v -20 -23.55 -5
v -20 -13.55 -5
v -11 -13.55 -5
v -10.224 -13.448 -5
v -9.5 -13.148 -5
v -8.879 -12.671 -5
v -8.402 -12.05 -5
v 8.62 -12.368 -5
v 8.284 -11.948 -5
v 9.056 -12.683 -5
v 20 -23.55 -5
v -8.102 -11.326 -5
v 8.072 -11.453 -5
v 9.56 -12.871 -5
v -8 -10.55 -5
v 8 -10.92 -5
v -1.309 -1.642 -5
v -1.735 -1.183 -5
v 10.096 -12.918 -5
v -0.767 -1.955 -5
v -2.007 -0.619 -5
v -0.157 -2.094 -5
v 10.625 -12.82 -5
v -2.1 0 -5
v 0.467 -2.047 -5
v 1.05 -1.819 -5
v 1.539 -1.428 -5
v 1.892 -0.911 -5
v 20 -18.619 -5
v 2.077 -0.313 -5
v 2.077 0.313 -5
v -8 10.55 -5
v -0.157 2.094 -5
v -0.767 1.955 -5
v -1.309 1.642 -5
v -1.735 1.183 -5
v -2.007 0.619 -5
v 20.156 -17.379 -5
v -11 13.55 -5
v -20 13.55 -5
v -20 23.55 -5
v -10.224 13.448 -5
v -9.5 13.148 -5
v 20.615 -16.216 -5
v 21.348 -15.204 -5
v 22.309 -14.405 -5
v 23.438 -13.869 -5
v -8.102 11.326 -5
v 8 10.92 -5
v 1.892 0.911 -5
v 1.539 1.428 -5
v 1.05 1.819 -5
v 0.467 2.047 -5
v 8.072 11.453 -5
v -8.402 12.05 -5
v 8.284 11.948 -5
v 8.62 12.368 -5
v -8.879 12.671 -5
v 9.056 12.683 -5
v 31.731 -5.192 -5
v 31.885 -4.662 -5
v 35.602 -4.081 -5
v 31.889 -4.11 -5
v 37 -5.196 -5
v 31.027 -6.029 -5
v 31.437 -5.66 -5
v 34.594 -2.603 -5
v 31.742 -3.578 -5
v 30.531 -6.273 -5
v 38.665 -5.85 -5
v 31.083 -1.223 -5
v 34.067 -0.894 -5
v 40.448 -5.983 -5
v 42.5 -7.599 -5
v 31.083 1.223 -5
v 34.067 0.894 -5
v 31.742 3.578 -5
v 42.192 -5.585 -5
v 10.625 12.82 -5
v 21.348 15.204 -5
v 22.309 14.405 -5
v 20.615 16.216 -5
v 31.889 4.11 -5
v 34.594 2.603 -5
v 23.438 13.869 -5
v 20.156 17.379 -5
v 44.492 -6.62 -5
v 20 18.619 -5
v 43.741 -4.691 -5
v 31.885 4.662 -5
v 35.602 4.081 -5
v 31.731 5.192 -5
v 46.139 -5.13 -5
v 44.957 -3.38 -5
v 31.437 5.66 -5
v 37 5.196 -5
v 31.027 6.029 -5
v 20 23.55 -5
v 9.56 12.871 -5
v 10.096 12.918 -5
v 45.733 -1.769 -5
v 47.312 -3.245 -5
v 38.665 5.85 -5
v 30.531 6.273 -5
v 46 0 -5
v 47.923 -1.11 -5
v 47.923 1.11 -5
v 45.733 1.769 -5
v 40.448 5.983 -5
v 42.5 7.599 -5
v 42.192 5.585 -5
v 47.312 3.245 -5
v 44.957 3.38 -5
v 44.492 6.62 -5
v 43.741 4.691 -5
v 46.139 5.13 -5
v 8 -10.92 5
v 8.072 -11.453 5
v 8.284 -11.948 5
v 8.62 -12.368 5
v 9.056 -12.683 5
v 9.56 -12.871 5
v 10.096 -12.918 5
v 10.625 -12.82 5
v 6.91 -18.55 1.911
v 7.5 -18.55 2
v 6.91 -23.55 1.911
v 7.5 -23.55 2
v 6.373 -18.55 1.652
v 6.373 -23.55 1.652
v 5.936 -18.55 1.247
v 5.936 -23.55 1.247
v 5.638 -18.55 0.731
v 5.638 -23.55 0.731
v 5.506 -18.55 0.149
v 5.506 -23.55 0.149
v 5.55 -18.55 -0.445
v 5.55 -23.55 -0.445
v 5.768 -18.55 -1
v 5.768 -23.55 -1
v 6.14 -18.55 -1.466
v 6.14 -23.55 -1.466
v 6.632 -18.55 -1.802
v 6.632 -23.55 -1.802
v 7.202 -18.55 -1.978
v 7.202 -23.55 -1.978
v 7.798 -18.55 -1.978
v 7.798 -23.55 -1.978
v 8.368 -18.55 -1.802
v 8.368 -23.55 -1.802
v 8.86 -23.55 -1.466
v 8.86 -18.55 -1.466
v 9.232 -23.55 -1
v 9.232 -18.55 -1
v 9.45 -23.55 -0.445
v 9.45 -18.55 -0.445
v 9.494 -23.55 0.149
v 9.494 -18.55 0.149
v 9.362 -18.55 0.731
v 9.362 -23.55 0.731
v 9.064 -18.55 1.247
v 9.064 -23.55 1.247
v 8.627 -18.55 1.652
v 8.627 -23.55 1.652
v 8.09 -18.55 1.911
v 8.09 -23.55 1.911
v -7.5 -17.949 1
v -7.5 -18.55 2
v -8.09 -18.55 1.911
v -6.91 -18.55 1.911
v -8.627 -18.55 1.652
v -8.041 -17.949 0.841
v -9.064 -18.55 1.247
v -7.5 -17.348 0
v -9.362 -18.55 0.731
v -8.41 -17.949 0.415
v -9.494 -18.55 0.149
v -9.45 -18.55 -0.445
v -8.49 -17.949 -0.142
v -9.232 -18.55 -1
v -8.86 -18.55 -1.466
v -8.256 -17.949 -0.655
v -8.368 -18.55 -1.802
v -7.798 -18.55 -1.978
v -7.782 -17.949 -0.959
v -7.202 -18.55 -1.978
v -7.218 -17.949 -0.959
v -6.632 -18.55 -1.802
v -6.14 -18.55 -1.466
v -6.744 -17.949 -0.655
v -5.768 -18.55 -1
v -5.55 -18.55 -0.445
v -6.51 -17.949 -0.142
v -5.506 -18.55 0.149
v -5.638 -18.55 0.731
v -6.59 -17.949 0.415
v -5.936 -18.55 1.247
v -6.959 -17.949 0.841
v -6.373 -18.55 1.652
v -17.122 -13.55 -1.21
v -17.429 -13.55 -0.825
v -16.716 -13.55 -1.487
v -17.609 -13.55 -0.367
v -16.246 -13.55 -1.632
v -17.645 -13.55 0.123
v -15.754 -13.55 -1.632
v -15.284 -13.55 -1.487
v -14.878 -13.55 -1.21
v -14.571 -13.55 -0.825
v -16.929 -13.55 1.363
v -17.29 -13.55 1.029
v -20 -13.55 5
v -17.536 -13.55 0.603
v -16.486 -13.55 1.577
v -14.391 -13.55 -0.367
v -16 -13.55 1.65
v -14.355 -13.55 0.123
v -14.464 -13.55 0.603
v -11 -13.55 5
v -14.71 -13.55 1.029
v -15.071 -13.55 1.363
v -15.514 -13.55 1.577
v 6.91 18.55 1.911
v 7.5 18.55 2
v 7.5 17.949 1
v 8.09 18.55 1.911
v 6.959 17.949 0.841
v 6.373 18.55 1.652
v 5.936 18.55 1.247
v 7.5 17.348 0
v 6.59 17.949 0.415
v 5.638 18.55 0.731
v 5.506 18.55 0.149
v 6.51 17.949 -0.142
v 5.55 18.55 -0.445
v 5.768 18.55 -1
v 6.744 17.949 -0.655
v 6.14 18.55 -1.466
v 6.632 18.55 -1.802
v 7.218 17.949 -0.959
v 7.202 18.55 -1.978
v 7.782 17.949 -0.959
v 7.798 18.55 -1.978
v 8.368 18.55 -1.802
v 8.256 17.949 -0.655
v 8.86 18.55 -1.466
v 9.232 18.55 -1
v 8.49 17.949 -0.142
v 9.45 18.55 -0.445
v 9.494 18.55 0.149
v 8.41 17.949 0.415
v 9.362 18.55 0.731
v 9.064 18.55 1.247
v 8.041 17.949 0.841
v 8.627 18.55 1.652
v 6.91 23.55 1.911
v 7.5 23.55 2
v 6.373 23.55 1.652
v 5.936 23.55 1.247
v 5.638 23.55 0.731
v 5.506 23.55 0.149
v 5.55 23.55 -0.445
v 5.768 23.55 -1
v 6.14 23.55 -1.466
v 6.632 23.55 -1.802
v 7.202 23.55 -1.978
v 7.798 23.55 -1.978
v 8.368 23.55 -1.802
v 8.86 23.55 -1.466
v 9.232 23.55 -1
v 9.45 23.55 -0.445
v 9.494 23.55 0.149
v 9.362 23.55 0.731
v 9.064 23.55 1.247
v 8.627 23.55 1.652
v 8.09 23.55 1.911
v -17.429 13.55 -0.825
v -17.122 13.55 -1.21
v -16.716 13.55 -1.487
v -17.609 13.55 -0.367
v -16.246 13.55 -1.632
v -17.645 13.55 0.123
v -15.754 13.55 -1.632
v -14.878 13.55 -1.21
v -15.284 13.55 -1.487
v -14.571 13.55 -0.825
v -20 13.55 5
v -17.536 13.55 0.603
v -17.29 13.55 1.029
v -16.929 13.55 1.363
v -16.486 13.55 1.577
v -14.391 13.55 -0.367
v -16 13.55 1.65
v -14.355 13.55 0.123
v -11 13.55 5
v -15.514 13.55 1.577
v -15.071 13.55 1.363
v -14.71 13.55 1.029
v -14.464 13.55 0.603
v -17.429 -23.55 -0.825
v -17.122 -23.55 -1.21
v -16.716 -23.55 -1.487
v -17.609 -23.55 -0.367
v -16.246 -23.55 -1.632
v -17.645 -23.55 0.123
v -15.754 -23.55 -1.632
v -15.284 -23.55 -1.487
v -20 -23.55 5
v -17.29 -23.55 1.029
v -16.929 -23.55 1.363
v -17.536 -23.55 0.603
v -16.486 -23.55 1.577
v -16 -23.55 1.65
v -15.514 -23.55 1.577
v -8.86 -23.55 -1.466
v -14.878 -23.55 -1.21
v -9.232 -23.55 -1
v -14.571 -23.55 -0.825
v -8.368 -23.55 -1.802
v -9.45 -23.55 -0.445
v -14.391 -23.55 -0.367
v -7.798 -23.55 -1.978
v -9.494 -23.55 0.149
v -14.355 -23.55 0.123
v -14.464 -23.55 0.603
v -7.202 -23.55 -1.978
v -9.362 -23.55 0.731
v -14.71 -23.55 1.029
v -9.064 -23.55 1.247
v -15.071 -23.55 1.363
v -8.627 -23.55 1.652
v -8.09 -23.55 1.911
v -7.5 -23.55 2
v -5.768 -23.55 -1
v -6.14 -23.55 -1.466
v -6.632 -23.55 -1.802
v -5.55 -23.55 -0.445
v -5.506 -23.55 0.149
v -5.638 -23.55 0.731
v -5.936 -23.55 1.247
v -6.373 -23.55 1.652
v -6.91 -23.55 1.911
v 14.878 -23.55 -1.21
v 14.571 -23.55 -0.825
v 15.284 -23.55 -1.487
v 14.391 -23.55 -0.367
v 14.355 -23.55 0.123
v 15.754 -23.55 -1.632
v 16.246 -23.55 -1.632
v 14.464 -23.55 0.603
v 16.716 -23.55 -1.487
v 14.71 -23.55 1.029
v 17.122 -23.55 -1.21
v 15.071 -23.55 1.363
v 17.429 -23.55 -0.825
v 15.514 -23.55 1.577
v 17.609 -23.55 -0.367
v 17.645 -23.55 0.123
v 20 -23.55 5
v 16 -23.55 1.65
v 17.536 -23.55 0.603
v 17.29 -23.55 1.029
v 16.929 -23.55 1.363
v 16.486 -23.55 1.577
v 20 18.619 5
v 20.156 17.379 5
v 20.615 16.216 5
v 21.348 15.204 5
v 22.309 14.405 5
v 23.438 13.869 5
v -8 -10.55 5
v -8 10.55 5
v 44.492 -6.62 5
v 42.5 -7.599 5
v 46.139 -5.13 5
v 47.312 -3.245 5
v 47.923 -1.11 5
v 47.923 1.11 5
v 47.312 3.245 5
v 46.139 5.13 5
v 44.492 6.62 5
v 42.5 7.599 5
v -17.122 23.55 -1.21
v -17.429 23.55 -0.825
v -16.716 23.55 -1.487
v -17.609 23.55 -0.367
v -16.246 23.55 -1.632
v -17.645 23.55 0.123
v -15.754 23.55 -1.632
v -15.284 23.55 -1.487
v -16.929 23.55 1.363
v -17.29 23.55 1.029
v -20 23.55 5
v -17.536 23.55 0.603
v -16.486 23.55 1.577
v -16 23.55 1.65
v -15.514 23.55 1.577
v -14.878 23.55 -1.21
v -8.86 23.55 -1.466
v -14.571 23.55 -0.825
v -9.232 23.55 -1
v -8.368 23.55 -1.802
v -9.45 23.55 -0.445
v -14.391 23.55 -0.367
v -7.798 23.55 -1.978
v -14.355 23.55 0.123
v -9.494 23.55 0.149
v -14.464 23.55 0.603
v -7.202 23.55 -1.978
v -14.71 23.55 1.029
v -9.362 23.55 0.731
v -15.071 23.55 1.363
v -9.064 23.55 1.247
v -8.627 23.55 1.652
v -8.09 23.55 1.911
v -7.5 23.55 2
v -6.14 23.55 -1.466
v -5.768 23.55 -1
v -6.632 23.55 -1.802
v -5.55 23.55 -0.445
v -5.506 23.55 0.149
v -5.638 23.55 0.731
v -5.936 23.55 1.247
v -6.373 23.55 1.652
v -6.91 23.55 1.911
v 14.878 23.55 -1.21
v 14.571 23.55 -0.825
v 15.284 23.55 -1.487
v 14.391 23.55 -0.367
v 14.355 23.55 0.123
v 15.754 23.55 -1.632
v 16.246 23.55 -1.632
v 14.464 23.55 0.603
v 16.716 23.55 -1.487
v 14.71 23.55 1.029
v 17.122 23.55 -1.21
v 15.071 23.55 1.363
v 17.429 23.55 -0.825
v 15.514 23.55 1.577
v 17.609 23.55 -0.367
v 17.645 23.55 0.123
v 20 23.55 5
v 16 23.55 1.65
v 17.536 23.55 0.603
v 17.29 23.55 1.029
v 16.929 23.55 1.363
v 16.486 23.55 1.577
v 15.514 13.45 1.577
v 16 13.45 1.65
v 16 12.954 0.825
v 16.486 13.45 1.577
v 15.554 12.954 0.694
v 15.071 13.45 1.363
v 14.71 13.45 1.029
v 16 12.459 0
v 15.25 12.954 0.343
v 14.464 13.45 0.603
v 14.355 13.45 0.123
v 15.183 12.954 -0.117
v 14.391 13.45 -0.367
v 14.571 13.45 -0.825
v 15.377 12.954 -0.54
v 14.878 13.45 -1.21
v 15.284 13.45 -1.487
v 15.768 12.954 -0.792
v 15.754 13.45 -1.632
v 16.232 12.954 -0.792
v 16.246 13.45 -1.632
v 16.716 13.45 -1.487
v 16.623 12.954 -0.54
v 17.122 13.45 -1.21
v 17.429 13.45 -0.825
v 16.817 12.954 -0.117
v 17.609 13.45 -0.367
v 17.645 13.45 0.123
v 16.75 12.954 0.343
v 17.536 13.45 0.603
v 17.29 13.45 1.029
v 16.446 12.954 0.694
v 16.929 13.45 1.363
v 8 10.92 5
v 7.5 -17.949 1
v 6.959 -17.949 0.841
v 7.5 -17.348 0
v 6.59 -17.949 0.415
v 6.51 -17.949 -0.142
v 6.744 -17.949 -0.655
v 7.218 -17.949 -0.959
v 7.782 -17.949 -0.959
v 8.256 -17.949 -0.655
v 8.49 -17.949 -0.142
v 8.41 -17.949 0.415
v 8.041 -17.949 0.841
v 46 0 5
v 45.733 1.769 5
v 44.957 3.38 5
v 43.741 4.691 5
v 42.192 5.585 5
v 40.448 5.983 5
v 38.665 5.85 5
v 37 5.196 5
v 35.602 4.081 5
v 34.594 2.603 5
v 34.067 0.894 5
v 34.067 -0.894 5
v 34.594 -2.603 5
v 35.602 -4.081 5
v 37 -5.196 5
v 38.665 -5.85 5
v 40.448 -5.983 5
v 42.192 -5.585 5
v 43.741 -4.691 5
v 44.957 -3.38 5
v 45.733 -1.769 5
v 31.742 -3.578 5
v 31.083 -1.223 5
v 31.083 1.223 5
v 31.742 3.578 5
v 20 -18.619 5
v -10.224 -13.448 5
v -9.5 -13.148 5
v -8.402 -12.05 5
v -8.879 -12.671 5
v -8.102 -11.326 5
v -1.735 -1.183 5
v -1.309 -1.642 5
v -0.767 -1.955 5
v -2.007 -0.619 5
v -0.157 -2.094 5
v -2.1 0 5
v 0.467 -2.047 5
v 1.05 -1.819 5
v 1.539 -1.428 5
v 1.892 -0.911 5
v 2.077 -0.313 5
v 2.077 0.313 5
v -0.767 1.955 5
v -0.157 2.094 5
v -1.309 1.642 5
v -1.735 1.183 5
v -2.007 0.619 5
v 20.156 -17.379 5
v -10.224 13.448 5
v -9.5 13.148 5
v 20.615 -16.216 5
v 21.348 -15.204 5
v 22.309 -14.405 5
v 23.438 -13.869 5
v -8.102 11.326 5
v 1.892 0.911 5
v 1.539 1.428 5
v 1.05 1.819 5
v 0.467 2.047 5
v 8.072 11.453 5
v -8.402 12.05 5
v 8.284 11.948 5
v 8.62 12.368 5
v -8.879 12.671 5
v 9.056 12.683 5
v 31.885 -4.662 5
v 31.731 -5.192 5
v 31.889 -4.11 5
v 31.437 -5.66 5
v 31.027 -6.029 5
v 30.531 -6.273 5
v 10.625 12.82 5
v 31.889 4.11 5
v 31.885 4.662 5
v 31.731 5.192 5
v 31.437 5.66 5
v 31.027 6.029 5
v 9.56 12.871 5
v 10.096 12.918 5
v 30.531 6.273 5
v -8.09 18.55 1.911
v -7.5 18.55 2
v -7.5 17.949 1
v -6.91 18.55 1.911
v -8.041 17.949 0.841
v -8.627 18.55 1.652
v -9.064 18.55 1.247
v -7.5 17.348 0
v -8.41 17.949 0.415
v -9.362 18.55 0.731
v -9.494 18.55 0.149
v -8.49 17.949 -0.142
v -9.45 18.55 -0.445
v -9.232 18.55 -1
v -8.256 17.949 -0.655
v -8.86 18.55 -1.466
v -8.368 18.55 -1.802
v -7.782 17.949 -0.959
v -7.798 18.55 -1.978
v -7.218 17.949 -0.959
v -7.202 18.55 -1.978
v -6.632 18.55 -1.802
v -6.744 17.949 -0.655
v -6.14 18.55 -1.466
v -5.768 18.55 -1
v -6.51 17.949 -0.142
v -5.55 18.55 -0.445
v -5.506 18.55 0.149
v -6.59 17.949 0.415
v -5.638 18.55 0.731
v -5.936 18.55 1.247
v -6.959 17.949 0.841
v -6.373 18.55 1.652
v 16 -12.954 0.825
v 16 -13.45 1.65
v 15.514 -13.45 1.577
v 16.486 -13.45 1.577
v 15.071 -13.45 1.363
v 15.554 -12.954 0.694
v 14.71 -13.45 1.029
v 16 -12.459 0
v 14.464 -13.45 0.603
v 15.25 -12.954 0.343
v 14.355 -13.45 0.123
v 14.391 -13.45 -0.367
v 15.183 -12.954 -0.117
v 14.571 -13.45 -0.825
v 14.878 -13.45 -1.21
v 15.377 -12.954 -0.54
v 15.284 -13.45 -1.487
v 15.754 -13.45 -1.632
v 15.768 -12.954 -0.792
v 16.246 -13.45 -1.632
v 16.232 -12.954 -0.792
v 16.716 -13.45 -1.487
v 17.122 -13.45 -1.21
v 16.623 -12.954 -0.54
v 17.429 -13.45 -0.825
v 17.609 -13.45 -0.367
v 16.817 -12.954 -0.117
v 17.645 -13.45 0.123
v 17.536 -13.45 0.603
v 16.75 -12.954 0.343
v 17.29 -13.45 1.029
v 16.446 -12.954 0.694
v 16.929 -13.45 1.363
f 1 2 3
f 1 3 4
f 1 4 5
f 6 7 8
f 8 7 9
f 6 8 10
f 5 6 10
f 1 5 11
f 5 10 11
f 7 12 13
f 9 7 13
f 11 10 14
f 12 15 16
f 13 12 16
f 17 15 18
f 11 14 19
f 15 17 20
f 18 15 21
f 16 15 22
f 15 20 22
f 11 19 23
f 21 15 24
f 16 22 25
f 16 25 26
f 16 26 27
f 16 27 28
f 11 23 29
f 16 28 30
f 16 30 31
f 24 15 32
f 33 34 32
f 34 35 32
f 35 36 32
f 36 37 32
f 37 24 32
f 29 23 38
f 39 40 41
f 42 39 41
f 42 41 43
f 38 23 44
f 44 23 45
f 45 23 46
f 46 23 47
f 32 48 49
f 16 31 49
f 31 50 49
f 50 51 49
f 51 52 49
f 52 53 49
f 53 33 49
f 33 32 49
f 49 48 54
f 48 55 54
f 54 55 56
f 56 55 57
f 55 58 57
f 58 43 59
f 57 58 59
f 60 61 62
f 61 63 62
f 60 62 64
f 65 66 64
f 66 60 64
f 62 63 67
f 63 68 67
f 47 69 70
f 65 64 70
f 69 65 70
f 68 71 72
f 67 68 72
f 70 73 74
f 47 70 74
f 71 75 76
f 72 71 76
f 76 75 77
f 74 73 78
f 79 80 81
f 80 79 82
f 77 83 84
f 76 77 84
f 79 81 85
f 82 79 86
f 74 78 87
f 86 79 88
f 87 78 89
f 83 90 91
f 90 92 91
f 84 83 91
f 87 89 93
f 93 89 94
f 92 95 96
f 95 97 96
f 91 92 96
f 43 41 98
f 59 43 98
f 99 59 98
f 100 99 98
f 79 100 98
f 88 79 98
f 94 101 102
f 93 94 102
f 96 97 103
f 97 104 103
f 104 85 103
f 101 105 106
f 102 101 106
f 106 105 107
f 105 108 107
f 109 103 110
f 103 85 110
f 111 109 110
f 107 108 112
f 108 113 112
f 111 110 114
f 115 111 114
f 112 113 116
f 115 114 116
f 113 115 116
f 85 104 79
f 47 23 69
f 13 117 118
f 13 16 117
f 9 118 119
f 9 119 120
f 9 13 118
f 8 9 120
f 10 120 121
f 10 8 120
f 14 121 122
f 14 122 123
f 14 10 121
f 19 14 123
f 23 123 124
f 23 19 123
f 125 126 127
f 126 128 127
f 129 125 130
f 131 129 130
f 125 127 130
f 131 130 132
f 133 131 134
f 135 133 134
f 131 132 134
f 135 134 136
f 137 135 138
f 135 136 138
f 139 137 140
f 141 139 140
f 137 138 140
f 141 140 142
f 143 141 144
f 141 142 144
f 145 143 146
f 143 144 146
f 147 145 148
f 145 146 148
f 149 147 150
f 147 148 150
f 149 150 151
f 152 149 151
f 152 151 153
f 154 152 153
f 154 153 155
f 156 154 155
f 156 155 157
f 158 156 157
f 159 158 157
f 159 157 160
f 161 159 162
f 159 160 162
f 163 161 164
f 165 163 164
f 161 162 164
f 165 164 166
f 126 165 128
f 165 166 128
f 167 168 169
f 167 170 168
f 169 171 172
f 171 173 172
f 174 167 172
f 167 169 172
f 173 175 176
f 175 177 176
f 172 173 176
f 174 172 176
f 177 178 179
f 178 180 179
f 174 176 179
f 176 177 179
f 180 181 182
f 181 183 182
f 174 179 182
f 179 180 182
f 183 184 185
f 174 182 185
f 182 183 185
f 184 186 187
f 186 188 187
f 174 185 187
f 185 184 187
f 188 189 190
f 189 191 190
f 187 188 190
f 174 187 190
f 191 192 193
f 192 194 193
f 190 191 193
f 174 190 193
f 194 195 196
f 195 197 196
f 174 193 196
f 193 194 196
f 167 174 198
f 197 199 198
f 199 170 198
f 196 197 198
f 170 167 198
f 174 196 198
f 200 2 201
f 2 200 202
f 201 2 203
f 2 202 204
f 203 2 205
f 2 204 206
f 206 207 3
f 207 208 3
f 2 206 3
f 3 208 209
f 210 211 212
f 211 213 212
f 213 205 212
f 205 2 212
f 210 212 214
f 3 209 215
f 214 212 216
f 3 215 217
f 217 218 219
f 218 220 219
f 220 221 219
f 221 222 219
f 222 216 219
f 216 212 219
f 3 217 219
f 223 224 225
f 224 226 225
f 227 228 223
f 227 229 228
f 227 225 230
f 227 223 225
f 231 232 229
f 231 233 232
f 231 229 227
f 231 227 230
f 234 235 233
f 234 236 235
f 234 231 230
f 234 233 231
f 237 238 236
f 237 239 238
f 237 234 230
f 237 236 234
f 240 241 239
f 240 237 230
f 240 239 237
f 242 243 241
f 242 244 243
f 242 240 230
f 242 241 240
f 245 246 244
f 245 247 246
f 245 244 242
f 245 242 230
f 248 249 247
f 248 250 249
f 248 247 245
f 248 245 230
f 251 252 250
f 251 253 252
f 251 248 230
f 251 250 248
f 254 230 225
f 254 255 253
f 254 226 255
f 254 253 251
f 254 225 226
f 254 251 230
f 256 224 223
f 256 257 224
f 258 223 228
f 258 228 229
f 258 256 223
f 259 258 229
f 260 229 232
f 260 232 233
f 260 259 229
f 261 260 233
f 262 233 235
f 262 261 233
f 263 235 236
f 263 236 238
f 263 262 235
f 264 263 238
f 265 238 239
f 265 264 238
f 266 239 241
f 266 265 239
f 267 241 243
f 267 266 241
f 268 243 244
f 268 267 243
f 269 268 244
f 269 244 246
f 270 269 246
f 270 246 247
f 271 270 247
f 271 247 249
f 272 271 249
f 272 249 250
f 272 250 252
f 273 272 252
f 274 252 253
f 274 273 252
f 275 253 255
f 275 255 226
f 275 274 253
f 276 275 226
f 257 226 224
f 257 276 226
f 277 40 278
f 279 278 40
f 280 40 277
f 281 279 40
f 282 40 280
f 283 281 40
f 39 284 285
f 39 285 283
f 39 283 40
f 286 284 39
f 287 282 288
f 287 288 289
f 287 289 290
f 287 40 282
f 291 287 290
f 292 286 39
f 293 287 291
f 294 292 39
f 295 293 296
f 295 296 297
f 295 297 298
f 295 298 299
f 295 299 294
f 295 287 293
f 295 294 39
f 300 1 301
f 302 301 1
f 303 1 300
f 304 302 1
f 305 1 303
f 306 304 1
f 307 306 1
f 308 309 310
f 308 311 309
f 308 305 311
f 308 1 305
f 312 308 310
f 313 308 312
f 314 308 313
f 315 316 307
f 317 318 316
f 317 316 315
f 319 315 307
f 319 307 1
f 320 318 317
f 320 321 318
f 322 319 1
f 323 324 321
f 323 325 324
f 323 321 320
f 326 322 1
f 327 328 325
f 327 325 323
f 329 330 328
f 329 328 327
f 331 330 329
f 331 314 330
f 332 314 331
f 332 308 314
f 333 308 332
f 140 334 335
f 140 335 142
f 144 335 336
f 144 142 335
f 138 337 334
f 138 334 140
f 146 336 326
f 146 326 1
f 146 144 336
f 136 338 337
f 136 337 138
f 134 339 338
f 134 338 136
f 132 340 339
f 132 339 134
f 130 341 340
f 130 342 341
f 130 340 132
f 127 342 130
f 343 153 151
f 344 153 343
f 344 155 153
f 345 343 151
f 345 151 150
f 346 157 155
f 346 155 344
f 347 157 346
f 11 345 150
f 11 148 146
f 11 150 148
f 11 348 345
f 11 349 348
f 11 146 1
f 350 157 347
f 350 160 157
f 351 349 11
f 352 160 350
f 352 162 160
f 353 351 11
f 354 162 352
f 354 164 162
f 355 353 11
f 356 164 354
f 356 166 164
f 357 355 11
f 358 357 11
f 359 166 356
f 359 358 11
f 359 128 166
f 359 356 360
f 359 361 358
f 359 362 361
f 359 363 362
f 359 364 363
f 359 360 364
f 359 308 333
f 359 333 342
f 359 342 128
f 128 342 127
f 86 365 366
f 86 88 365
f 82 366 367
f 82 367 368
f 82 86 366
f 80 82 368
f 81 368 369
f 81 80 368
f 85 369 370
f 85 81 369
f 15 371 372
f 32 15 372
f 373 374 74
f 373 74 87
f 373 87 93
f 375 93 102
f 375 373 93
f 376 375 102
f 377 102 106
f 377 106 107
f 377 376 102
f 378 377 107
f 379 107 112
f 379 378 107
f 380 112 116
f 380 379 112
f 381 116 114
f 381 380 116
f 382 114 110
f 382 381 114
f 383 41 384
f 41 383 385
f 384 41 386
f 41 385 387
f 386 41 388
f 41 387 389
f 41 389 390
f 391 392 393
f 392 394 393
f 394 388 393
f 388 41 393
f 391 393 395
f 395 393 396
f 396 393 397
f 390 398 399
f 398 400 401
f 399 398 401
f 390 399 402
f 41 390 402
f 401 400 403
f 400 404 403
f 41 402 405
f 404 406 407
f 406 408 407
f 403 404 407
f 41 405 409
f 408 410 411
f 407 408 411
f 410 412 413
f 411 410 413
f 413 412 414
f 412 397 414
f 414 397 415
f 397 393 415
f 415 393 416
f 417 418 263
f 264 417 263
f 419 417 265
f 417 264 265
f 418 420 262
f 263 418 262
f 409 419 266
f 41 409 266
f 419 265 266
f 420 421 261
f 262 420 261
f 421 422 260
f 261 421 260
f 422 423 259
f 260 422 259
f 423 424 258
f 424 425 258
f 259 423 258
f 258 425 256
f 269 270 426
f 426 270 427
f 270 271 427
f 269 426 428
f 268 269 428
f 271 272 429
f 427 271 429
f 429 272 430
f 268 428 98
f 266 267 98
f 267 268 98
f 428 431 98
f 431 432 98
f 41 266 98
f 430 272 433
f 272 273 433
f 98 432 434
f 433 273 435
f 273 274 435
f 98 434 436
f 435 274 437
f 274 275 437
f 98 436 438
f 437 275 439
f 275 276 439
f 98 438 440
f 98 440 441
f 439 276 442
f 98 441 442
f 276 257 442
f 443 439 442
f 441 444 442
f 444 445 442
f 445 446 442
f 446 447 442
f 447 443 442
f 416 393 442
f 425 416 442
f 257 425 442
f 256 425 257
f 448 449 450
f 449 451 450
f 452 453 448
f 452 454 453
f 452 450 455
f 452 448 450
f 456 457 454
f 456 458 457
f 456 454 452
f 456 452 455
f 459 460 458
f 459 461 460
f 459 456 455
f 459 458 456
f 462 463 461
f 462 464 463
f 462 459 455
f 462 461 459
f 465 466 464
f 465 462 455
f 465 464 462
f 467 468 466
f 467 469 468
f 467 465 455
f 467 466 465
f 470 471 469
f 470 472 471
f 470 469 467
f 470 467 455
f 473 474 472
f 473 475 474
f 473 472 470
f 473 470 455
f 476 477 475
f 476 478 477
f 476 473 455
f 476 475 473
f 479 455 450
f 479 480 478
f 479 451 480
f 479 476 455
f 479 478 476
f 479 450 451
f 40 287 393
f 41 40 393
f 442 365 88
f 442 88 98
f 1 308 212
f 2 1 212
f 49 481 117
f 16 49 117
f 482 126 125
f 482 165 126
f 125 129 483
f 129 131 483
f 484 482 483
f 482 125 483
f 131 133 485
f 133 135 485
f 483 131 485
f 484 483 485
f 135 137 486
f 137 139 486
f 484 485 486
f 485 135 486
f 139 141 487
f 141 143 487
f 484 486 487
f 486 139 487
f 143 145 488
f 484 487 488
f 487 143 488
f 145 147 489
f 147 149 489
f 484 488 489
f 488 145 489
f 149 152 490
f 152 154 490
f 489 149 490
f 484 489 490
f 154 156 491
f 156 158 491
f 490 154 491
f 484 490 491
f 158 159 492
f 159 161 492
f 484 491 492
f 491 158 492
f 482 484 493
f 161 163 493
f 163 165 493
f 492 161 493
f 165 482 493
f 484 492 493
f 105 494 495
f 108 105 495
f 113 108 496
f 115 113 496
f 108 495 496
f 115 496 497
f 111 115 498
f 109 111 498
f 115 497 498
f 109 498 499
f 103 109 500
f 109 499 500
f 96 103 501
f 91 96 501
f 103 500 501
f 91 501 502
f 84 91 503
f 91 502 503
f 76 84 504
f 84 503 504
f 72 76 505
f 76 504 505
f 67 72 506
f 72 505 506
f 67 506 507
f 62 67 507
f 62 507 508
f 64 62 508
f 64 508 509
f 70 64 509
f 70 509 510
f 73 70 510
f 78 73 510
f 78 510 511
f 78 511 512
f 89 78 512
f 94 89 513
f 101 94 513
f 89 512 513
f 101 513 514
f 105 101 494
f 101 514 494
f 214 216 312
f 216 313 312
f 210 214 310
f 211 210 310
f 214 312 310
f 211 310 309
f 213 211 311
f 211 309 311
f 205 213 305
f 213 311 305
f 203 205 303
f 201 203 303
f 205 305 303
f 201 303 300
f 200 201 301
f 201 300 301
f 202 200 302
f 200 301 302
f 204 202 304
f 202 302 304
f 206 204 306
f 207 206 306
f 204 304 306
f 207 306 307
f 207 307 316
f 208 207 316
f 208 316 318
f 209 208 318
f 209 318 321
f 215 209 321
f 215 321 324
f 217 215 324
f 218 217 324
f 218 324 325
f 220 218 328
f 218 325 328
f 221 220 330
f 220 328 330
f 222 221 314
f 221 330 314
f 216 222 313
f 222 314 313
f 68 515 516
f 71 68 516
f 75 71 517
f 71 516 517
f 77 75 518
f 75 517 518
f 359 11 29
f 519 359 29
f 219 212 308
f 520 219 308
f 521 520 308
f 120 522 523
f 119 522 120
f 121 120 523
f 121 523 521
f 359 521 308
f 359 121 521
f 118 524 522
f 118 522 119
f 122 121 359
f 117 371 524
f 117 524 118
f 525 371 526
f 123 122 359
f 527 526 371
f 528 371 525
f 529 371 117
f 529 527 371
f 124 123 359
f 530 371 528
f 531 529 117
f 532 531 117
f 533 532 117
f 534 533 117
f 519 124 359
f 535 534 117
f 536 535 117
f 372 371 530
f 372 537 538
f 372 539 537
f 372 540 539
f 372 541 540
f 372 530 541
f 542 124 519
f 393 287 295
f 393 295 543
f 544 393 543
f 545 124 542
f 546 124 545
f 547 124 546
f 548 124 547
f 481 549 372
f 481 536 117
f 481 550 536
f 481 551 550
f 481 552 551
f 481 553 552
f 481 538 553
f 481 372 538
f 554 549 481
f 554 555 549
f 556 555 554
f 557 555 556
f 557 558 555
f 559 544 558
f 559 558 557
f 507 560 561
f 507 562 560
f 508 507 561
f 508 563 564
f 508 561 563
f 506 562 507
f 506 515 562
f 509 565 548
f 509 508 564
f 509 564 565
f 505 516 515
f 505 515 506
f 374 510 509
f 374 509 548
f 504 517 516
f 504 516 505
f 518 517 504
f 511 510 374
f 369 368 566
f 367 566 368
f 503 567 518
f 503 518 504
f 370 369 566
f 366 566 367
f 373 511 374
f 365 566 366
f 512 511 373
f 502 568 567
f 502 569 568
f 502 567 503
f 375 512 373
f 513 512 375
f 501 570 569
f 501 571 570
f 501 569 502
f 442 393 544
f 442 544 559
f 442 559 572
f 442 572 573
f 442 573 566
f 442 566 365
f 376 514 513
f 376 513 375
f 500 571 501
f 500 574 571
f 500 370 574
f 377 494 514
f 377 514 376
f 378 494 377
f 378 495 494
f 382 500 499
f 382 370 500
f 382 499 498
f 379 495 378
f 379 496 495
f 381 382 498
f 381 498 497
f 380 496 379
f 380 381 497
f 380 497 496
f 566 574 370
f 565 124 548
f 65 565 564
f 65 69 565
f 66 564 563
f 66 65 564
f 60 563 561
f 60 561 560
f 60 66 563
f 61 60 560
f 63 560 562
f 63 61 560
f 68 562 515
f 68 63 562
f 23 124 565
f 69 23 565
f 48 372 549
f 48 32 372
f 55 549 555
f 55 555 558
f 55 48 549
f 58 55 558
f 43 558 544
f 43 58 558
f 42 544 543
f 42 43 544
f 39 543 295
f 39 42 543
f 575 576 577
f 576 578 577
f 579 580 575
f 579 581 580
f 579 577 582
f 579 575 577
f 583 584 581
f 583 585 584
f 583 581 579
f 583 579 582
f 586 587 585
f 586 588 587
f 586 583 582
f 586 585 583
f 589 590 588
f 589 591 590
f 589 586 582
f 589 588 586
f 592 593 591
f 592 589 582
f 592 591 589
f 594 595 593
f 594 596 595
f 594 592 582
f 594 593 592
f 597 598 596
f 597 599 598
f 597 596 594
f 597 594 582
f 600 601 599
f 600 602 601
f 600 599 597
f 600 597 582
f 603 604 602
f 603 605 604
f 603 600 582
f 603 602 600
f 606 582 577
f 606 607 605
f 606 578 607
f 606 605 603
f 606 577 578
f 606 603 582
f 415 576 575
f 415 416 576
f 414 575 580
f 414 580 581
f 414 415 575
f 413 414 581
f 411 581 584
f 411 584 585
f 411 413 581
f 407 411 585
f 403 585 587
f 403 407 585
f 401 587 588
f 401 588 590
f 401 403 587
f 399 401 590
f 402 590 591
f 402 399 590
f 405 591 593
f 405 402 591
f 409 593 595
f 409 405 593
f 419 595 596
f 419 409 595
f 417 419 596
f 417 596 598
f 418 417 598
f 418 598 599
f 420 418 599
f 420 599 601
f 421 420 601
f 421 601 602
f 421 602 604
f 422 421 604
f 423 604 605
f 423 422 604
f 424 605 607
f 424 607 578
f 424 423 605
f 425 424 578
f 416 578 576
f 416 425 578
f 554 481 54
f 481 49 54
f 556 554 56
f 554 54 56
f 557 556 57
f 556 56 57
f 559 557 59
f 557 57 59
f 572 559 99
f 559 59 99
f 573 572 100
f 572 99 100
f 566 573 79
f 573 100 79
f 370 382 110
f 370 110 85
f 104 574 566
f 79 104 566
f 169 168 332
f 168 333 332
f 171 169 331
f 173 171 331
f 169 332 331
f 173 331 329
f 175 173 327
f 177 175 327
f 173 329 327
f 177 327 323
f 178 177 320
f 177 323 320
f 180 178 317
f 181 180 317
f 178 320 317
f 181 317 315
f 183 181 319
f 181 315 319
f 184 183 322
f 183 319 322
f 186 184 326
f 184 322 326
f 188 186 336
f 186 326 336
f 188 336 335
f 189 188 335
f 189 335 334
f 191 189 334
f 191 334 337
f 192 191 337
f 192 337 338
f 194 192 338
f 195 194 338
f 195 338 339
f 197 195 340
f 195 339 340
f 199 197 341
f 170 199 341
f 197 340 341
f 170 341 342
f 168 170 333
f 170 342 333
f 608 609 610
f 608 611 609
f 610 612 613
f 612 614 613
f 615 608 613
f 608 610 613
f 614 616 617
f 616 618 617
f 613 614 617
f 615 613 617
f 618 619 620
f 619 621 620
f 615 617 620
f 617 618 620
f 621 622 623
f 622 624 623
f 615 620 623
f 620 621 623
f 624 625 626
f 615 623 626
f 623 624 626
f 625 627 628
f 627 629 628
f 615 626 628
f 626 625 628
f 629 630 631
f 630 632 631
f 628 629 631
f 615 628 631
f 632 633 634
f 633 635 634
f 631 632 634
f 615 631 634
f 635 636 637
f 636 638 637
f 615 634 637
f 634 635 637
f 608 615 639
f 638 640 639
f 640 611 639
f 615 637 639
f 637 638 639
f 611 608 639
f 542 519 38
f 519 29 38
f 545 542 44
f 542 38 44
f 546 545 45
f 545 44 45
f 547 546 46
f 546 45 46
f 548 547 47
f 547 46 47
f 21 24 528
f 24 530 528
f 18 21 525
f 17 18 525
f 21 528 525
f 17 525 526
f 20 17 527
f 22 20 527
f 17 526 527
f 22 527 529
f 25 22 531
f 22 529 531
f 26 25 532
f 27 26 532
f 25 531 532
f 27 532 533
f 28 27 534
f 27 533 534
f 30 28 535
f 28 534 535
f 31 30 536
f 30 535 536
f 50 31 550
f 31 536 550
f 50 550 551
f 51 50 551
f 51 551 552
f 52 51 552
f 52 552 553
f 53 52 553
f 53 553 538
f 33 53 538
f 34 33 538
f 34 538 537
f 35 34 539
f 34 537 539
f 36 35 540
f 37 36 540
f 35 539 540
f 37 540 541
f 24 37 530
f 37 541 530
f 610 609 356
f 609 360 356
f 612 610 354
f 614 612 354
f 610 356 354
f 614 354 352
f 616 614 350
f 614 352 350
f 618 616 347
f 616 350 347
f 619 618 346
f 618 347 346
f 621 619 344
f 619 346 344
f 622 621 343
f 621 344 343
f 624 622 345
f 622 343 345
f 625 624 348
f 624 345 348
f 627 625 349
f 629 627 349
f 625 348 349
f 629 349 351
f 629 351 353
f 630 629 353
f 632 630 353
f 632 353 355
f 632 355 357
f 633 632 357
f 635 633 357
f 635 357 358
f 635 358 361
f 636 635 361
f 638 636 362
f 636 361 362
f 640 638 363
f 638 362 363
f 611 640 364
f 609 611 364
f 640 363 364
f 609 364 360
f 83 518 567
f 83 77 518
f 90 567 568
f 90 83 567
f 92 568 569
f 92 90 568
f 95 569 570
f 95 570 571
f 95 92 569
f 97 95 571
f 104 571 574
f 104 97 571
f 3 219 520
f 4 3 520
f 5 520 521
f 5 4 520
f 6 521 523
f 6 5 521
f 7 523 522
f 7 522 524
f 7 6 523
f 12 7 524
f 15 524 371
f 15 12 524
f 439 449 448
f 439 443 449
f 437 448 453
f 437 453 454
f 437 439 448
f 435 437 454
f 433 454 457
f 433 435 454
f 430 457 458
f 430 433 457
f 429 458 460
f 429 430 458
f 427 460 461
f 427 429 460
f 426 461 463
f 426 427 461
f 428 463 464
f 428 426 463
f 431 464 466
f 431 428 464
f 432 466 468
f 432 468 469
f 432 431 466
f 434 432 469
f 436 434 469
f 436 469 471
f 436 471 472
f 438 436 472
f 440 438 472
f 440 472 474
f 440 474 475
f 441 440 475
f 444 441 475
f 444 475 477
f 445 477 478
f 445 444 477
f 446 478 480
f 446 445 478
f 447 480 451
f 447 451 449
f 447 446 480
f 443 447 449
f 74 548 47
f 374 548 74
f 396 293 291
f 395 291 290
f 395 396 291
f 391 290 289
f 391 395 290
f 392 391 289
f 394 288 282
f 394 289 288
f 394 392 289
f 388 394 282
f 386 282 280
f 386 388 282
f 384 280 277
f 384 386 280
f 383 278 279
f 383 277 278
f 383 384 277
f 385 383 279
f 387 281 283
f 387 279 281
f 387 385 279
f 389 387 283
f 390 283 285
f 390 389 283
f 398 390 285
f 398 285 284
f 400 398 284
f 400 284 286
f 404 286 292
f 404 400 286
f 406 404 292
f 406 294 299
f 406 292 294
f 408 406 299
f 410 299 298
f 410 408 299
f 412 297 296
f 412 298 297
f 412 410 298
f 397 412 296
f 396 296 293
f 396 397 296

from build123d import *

# Parameters (mm, degrees)
SKETCH_1_W                  = 40
SKETCH_1_H                  = 47.1
EXTRUDE_1_DEPTH             = 5
HOLE_WIZARD_M4_1_AT_2_COUNT = 2
HOLE_WIZARD_M4_1_AT_2_PITCH = 32
SKETCH_5_R                  = 2.1
CUT_EXTRUDE_M5_DEPTH        = 25
SKETCH_6_R                  = 6
EXTRUDE_1739_DEPTH          = 10
FILLET_1_R                  = 5
SKETCH_7_W                  = 24
SKETCH_7_H                  = 27.1
CUT_EXTRUDE_1_DEPTH         = 10
FILLET_2_R                  = 3
F_4_0MM_1_AT_2_COUNT        = 2
F_4_0MM_1_AT_2_PITCH        = 15
CUT_EXTRUDE_3_DEPTH         = 10
FILLET_3_R                  = 2


with BuildPart() as part:
    # 草图1 → 凸台-拉伸1 (new, symmetric)
    with BuildSketch(Plane.XY):
        Rectangle(SKETCH_1_W, SKETCH_1_H)
    extrude(amount=EXTRUDE_1_DEPTH, both=True)

    # 草图4 → M4 螺纹孔1 (revolve, cut)
    with BuildSketch(Plane(origin=(-16, 23.55, 0), x_dir=(0, 0, 1), z_dir=(1, 0, 0))):
        Polygon((0, 0), (0, 11.091420021), (1.65, 10.1), (1.65, 0), align=None)
    hole_wizard_m4_1 = revolve(axis=Axis((-16, 29.9, 0), (0, -1, 0)), mode=Mode.SUBTRACT)

    # M4 螺纹孔1 at 2: M4 螺纹孔1 ×2
    with Locations(*[(i * HOLE_WIZARD_M4_1_AT_2_PITCH, 0, 0) for i in range(1, HOLE_WIZARD_M4_1_AT_2_COUNT)]):
        add(hole_wizard_m4_1, mode=Mode.SUBTRACT)

    # 镜向1: M4 螺纹孔1 across plane
    add(hole_wizard_m4_1.mirror(Plane.ZX), mode=Mode.SUBTRACT)

    # 镜向1 copy 1 sketch → 镜向1 copy 1 (revolve, cut)
    with BuildSketch(Plane(origin=(16, -23.55, 0), x_dir=(0, 0, 1), z_dir=(1, 0, 0))):
        Polygon((0, 0), (0, -11.091420021), (1.65, -10.1), (1.65, 0), align=None)
    revolve(axis=Axis((16, -29.9, 0), (0, -1, 0)), mode=Mode.SUBTRACT)

    # 草图5 → M5螺纹孔 (cut, symmetric)
    with BuildSketch(Plane.XY.offset(5)):
        with Locations(Location((0, 0, 0), (0, 0, 180))):
            Circle(SKETCH_5_R)
    extrude(amount=CUT_EXTRUDE_M5_DEPTH, both=True, mode=Mode.SUBTRACT)

    # 草图6 → Extrude 1739 (add)
    with BuildSketch(Plane.XY.offset(5)):
        with BuildLine():
            Line((42.499604204, 7.599472273), (20, 15))
            Line((20, 15), (20, -15))
            Line((20, -15), (42.499604204, -7.599472273))
            ThreePointArc((42.499604204, -7.599472273), (48, 0), (42.499604204, 7.599472273))
        make_face()
        with Locations((40, 0)):
            Circle(SKETCH_6_R, mode=Mode.SUBTRACT)
    extrude(amount=-EXTRUDE_1739_DEPTH)

    # 圆角1
    fillet_1_edges = [part.edges().sort_by_distance(p)[0] for p in [
        (20, -15, 0),
        (20, 15, 0),
    ]]
    fillet(fillet_1_edges, radius=FILLET_1_R)

    # 草图7 → 切除-拉伸1 (cut)
    with BuildSketch(Plane.XY.offset(5)):
        with Locations((-20, 0)):
            Rectangle(SKETCH_7_W, SKETCH_7_H)
    extrude(amount=-CUT_EXTRUDE_1_DEPTH, mode=Mode.SUBTRACT)

    # 圆角2
    fillet_2_edges = [part.edges().sort_by_distance(p)[0] for p in [
        (-8, -13.55, 0),
        (-8, 13.55, 0),
    ]]
    fillet(fillet_2_edges, radius=FILLET_2_R)

    # 草图11 → Ø4.0mm 暗销孔1 (revolve, cut)
    with BuildSketch(Plane(origin=(-7.5, 23.55, 0), x_dir=(0, 0, 1), z_dir=(1, 0, 0))):
        Polygon((0, 0), (0, 6.201721238), (2, 5), (2, 0), align=None)
    f_4_0mm_1 = revolve(axis=Axis((-7.5, 29.9, 0), (0, -1, 0)), mode=Mode.SUBTRACT)

    # Ø4.0mm 暗销孔1 at 2: Ø4.0mm 暗销孔1 ×2
    with Locations(*[(i * F_4_0MM_1_AT_2_PITCH, 0, 0) for i in range(1, F_4_0MM_1_AT_2_COUNT)]):
        add(f_4_0mm_1, mode=Mode.SUBTRACT)

    # 镜向3: Ø4.0mm 暗销孔1 across plane
    add(f_4_0mm_1.mirror(Plane.ZX), mode=Mode.SUBTRACT)

    # 镜向3 copy 1 sketch → 镜向3 copy 1 (revolve, cut)
    with BuildSketch(Plane(origin=(7.5, -23.55, 0), x_dir=(0, 0, 1), z_dir=(1, 0, 0))):
        Polygon((0, 0), (0, -6.201721238), (2, -5), (2, 0), align=None)
    revolve(axis=Axis((7.5, -29.9, 0), (0, -1, 0)), mode=Mode.SUBTRACT)

    # 草图12 → 切除-拉伸3 (cut)
    with BuildSketch(Plane.XY.offset(5)):
        with BuildLine():
            Line((8, 13.683494171), (8, -13.683494171))
            Line((8, -13.683494171), (32.876894011, -5.501032727))
            ThreePointArc((32.876894011, -5.501032727), (31, 0), (32.876894011, 5.501032727))
            Line((32.876894011, 5.501032727), (8, 13.683494171))
        make_face()
    extrude(amount=-CUT_EXTRUDE_3_DEPTH, mode=Mode.SUBTRACT)

    # 圆角3
    fillet_3_edges = [part.edges().sort_by_distance(p)[0] for p in [
        (8, 13.683494171, 0),
        (32.876894011, 5.501032727, 0),
        (32.876894011, -5.501032727, 0),
        (8, -13.683494171, 0),
    ]]
    fillet(fillet_3_edges, radius=FILLET_3_R)


solid = part.part
